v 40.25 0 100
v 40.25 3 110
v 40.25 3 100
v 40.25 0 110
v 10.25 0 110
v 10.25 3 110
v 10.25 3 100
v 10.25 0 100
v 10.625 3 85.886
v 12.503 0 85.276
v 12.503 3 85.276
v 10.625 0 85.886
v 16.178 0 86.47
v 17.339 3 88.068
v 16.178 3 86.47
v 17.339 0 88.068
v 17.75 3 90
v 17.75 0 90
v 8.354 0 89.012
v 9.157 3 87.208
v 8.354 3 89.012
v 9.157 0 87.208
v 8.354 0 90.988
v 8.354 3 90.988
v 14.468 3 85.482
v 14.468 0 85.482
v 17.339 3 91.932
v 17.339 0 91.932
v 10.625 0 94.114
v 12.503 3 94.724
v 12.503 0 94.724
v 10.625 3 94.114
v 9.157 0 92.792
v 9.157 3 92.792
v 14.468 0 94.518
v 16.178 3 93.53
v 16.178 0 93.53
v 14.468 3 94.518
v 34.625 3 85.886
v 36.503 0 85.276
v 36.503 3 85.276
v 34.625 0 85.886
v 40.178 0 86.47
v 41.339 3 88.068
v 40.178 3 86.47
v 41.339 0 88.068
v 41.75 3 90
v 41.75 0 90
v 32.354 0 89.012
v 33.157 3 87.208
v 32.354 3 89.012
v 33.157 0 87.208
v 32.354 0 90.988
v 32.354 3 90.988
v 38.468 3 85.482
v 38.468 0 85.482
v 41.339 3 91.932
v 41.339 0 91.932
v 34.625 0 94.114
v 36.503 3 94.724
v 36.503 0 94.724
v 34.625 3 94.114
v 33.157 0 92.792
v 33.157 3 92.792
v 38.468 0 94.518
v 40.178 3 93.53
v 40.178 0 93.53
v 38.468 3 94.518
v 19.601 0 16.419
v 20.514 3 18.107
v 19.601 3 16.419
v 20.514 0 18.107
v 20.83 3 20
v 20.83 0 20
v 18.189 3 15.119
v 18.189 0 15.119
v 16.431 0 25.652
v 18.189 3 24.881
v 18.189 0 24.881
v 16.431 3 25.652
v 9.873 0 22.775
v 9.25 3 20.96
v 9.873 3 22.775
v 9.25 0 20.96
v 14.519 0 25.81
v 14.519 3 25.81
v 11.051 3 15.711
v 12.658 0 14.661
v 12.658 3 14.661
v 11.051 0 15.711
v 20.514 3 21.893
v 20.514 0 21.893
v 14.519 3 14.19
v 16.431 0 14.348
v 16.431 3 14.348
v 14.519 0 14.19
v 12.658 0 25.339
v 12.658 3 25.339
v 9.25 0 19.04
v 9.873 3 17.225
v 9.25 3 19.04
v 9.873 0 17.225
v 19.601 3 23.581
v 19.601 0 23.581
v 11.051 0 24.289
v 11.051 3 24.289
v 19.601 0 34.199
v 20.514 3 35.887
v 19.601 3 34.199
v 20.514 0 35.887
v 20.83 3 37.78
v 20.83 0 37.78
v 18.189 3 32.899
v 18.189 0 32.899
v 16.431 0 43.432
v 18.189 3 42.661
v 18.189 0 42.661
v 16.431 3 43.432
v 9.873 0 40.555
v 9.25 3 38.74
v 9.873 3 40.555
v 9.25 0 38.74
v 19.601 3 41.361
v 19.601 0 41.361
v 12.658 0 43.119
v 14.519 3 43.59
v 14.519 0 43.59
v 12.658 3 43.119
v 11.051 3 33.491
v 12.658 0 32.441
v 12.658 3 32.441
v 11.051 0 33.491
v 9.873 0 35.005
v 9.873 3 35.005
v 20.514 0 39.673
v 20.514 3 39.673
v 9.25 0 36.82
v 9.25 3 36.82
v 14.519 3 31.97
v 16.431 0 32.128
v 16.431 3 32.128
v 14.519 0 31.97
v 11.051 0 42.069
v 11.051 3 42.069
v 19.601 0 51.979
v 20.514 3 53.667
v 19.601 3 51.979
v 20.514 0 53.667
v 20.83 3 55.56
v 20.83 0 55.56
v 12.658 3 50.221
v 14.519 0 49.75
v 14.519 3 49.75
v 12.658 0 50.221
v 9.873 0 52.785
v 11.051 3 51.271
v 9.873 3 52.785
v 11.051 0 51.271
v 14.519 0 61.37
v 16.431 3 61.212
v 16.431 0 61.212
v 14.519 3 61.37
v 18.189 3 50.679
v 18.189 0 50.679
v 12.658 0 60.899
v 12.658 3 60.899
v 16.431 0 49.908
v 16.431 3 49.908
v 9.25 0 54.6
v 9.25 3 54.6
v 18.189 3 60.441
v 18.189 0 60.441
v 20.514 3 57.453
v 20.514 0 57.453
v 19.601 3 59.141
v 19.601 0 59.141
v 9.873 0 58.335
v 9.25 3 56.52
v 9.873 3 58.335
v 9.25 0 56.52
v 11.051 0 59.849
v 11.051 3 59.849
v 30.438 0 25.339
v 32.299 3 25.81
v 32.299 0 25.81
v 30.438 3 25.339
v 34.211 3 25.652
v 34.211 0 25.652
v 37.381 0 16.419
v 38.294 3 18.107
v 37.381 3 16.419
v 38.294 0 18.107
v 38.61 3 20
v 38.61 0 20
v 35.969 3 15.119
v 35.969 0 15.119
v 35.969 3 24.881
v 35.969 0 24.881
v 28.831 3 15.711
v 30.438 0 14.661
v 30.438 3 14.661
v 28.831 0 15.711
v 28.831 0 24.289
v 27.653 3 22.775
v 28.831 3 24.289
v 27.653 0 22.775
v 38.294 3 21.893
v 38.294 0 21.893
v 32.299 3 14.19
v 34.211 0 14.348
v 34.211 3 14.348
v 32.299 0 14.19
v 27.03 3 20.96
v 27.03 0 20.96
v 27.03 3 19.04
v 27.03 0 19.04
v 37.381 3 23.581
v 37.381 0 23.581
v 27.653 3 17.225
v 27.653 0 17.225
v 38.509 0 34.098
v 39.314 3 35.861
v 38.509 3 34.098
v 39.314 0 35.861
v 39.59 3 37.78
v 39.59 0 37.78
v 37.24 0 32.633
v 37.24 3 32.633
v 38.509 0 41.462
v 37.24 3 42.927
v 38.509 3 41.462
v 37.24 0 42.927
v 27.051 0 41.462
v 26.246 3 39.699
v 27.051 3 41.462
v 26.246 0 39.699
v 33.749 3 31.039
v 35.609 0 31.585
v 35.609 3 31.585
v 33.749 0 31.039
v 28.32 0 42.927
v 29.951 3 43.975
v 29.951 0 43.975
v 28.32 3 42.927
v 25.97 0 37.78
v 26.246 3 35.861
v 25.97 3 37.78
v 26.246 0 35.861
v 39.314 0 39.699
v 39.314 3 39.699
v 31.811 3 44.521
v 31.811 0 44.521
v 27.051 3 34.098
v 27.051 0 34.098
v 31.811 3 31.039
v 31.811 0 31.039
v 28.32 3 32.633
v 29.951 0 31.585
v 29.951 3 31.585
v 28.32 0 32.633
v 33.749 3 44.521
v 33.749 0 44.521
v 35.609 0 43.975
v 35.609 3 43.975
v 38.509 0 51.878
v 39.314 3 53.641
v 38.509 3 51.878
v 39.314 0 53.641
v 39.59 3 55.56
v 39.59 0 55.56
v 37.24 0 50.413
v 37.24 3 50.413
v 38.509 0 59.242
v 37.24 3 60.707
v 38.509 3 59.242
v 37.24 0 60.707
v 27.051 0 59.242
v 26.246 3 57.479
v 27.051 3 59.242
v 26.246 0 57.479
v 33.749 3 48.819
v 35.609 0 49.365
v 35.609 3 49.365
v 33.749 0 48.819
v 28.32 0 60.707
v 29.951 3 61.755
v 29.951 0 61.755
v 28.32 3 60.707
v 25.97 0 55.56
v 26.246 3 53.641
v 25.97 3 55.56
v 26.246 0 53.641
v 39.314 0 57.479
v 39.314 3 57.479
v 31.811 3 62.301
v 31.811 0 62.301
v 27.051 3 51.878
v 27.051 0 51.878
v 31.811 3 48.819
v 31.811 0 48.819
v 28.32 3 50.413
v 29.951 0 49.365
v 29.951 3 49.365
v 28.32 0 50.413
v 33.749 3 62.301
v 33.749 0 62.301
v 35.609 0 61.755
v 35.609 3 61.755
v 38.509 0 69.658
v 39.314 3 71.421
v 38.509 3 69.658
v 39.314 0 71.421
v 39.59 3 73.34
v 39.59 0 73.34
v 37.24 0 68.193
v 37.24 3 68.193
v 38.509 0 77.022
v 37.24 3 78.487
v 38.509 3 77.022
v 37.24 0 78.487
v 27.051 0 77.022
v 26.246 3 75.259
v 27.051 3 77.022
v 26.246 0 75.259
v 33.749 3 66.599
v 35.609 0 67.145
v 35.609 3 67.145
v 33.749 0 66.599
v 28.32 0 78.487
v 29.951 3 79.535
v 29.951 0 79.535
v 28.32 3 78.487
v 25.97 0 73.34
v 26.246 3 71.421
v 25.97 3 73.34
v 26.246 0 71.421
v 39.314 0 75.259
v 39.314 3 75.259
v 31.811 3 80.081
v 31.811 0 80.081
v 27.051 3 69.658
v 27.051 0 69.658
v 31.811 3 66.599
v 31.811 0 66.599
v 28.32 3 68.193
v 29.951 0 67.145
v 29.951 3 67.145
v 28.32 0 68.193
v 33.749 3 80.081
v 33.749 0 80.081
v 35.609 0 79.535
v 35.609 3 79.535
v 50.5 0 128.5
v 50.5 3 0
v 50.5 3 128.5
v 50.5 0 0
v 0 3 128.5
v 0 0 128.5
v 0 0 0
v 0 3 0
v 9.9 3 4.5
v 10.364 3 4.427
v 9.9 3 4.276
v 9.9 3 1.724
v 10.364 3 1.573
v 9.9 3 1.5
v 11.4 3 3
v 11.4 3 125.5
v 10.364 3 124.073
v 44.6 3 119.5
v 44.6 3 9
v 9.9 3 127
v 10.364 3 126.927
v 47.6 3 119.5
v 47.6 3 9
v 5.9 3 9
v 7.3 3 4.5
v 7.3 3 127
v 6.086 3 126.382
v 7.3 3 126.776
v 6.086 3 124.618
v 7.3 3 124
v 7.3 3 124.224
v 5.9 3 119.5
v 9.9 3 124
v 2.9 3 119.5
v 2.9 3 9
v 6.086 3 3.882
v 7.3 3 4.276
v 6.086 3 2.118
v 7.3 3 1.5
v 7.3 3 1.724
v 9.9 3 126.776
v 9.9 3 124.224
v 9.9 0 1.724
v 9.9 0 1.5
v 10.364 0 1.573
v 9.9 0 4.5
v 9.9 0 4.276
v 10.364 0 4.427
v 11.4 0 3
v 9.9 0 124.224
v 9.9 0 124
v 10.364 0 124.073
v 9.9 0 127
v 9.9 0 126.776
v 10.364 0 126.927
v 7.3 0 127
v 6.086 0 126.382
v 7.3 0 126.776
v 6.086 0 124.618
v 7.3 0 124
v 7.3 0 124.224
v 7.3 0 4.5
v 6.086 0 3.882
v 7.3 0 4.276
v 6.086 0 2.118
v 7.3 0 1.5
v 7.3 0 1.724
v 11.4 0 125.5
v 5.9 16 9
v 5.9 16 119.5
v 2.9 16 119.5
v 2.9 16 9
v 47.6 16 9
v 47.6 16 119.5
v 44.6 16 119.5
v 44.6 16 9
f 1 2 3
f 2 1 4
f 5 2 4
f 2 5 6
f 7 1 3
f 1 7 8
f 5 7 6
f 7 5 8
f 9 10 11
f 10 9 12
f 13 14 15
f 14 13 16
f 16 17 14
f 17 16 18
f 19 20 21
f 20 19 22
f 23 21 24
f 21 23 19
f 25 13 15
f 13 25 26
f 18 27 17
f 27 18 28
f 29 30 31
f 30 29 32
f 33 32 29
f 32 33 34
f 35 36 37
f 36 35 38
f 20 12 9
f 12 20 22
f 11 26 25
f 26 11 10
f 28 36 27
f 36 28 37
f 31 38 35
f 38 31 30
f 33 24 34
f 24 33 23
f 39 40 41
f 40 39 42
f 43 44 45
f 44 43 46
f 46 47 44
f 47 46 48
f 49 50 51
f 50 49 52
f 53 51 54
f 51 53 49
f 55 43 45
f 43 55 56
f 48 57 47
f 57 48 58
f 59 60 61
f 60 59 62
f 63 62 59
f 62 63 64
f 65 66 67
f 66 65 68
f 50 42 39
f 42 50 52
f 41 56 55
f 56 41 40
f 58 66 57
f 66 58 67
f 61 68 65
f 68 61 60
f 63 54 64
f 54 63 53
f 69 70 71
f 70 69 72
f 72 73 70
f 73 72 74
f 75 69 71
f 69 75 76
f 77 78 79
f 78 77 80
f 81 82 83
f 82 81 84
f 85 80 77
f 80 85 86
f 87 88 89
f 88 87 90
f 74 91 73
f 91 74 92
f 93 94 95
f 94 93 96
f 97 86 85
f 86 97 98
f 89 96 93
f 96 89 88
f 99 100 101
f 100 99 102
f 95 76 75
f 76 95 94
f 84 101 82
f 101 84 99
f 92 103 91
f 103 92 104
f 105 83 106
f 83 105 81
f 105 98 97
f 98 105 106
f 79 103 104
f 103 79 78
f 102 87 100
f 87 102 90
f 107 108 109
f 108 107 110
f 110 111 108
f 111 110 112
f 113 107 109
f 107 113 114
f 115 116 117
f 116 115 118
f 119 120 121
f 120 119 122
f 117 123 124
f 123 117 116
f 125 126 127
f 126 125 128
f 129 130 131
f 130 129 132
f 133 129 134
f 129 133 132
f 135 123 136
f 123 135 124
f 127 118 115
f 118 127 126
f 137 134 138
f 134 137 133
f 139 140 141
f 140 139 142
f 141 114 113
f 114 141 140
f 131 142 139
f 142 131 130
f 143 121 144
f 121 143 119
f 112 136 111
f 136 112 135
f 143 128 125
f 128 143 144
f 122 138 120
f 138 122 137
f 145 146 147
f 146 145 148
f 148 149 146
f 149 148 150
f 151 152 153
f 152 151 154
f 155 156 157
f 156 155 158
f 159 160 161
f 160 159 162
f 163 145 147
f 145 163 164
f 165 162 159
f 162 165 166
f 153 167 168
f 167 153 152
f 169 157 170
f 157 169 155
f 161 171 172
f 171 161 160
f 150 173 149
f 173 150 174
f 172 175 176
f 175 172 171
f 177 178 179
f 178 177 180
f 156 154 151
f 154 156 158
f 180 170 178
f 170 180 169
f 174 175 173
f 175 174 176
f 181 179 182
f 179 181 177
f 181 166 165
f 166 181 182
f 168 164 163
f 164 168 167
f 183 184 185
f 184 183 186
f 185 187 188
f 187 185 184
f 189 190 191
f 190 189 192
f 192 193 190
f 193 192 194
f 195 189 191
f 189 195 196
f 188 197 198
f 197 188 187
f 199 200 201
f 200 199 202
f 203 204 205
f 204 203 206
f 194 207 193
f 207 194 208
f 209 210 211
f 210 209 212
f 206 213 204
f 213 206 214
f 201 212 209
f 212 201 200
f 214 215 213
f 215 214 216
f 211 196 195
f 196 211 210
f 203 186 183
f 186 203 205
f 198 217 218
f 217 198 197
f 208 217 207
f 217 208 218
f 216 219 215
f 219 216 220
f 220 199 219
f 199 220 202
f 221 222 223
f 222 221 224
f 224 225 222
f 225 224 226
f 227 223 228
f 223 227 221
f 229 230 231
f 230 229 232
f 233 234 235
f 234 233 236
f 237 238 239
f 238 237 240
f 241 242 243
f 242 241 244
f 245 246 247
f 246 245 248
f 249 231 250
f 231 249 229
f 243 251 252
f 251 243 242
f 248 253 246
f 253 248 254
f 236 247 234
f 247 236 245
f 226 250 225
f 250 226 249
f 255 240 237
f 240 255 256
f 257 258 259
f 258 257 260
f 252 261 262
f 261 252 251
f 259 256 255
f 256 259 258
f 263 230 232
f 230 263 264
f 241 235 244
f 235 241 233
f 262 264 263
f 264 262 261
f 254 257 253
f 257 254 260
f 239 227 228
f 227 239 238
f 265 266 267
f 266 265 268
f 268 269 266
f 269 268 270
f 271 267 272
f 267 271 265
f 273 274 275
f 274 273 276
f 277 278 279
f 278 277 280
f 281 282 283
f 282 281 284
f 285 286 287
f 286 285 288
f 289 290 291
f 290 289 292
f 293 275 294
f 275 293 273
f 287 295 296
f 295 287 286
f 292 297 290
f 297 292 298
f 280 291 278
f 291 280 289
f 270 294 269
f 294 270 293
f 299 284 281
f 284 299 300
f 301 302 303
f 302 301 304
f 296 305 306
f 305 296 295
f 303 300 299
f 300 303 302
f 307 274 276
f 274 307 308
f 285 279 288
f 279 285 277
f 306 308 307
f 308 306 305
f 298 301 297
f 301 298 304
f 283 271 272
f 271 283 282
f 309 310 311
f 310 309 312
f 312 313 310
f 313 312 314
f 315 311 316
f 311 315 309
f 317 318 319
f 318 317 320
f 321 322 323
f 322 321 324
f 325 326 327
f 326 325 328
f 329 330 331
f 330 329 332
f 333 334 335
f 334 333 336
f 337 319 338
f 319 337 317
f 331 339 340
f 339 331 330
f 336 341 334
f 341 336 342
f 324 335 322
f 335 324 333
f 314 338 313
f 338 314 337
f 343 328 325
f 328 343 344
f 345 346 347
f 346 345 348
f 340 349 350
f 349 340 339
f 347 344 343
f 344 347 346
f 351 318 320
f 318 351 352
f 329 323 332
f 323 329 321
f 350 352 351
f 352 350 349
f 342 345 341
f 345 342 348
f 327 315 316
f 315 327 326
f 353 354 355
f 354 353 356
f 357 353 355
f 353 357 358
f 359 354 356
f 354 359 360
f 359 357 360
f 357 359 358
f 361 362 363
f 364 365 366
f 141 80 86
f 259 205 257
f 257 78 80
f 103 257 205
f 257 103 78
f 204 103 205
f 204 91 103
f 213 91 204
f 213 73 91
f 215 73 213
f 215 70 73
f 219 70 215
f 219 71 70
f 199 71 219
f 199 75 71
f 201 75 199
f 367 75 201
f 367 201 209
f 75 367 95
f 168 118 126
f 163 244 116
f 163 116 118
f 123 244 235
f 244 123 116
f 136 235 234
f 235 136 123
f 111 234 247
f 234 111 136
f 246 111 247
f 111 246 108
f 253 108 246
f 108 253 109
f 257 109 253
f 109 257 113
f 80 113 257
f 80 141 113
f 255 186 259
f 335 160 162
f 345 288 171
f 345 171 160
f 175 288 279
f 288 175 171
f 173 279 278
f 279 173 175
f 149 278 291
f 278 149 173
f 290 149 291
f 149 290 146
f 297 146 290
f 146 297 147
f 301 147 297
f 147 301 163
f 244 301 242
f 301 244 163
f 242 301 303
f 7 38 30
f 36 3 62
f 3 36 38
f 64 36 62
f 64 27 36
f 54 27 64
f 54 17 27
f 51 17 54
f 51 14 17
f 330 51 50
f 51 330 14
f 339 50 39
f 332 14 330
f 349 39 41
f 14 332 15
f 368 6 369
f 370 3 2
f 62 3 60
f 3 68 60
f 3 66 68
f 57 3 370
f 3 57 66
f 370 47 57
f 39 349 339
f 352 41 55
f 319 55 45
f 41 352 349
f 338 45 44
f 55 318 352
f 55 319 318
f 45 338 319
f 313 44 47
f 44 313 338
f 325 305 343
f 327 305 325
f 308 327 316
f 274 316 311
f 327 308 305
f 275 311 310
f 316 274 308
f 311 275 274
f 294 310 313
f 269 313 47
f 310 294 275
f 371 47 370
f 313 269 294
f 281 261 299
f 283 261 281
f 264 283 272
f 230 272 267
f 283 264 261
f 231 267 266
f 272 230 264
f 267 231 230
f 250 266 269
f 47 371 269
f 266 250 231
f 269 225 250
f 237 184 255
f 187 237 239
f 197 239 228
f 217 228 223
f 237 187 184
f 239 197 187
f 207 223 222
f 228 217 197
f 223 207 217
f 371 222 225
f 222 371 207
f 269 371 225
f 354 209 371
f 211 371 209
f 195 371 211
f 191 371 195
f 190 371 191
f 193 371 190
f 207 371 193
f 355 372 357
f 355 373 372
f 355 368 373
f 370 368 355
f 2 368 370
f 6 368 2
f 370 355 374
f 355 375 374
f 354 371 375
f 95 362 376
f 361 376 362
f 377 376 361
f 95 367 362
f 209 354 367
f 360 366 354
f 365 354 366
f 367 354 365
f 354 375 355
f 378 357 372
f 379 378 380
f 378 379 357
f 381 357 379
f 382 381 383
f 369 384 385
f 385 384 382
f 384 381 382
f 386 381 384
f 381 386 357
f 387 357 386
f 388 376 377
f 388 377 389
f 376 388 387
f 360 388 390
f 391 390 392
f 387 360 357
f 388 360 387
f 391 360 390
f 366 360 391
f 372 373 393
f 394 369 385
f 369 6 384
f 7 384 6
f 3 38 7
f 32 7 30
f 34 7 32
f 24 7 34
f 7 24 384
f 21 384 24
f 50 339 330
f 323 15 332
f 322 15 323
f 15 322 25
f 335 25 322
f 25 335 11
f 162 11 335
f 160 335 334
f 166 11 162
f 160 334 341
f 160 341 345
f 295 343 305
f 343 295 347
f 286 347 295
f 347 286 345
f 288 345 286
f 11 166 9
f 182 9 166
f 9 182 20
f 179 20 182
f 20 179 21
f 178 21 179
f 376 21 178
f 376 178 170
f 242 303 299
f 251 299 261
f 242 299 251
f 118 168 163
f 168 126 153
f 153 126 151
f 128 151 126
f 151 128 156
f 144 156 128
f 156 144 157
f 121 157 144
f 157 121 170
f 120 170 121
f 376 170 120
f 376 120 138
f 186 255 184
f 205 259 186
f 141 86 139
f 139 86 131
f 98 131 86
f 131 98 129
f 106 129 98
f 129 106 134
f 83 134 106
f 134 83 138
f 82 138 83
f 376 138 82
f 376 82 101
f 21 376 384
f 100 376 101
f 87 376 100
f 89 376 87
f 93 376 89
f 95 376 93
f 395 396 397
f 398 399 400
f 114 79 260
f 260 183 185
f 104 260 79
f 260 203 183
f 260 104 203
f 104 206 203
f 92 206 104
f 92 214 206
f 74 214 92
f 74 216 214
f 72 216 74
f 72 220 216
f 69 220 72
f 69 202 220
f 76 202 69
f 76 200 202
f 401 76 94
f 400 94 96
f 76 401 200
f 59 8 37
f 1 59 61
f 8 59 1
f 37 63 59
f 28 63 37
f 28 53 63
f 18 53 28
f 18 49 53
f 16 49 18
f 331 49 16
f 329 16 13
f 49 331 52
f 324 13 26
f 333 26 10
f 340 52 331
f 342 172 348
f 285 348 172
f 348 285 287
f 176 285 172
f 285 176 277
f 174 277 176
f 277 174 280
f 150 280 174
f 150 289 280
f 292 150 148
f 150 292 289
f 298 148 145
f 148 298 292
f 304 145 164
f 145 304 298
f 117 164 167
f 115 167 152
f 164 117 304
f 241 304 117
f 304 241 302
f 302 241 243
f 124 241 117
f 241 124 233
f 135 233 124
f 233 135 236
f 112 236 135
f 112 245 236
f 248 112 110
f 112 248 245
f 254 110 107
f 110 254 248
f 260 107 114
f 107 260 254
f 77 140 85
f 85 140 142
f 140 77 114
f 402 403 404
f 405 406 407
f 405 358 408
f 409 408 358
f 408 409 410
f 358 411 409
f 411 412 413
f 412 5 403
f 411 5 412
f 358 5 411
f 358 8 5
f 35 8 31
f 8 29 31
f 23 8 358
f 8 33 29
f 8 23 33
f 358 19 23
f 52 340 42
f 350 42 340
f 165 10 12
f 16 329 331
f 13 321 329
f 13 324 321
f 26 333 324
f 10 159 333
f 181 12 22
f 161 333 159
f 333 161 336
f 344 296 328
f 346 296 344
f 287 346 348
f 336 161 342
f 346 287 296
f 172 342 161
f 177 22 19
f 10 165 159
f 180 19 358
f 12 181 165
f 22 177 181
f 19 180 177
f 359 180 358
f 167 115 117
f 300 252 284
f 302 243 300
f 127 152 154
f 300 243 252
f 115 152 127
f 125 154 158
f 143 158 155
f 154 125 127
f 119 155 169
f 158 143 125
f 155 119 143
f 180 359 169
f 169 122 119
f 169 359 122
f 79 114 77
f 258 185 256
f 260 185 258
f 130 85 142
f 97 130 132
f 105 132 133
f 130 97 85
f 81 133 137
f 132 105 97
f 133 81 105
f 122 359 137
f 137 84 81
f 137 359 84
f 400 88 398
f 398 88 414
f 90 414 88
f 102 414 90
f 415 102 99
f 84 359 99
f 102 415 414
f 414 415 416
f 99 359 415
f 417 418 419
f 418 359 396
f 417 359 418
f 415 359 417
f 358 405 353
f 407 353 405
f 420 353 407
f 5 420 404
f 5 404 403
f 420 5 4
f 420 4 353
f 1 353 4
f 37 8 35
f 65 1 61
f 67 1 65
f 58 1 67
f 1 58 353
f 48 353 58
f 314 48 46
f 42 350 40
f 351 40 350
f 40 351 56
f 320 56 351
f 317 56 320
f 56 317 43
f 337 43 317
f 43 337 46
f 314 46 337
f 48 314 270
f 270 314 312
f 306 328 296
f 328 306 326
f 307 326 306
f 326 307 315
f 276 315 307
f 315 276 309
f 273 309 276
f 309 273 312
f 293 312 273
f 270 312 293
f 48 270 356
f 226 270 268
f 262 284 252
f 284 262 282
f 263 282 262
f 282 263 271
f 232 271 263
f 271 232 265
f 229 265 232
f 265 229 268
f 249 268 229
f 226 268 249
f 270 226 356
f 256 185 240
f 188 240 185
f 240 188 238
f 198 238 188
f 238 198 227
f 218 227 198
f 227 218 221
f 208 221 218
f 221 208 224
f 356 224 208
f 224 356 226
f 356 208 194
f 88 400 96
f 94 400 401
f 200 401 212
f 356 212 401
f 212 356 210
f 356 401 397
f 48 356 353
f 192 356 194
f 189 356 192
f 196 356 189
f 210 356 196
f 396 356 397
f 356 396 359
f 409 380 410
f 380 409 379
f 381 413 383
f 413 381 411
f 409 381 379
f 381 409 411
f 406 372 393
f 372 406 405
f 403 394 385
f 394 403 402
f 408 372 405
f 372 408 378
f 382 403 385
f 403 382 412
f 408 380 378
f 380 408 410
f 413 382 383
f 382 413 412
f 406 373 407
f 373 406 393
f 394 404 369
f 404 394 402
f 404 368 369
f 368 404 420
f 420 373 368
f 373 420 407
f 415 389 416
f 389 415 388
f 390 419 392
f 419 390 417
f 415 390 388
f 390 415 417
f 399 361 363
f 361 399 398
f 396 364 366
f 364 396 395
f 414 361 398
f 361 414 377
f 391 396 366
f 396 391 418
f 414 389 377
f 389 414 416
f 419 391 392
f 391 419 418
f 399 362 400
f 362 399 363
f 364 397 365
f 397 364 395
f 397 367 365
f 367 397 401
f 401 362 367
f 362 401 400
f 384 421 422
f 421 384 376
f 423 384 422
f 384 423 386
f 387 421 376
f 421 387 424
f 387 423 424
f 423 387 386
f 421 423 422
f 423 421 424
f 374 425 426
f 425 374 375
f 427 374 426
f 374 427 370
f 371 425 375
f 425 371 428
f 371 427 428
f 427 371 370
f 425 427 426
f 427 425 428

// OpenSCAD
//!OpenSCAD

// from https://www.blockscad3d.com/community/projects/718412

module hole_for_switch() {
  translate([0,-y2/2,0])
  rotate([270, 0, 0]){
      cylinder(r1=switch_dia, r2=switch_dia, h=y2*2, center=false);
  }
}

module hole_for_potentiometer() {
  translate([0,-y2/2,0])
  rotate([270, 0, 0]){
    cylinder(r1=pot_dia, r2=pot_dia, h=y2*2, center=false);
  }
}

module make_face_plate() {
  difference() {
    cube([x1, y2, z1], center=false);

    union(){
      translate([15, 0, (20 + 0 * 17.78)]){
        hole_for_jack();
      }
      translate([15, 0, (20 + 1 * 17.78)]){
        hole_for_jack();
      }
      translate([15, 0, (20 + 2 * 17.78)]){
        hole_for_jack();
      }
      translate([(15 + 17.78), 0, (20 + 0 * 17.78)]){
        hole_for_jack();
      }
      translate([(15 + 17.78), 0, (20 + 1 * 17.78)]){
        hole_for_potentiometer();
      }
      translate([(15 + 17.78), 0, (20 + 2 * 17.78)]){
        hole_for_potentiometer();
      }
      translate([(15 + 17.78), 0, (20 + 3 * 17.78)]){
        hole_for_potentiometer();
      }
      display_and_buttons();
    }
  }
}

module hole_for_jack() {
  translate([0,-y2/2,0])
  rotate([270, 0, 0]){
    cylinder(r1=jack_dia, r2=jack_dia, h=y2*2, center=false);
  }
}

module make_slot_pair() {
  union(){
    translate([0, 0, (z1 - z4)]){
      make_slot();
    }
    translate([0, 0, z4]){
      make_slot();
    }
  }
}

module make_right_slot_pair() {
  translate([(x4 + 5.08 * (Width_HP - 4)), 0, 0]){
    union(){
      translate([0, 0, (z1 - z4)]){
        make_slot();
      }
      translate([0, 0, z4]){
        make_slot();
      }
    }
  }
}

module display_and_buttons() {
  union(){
    translate([(x1 / 2), 0, 105]){
      cube([30, 10, 10], center=true);
    }
    translate([(5 + 8), 0, 90]){
      hole_for_switch();
    }
    translate([(5 + 32), 0, 90]){
      hole_for_switch();
    }
  }
}

module make_slot() {
  translate([0,-y2/2,0])
  union(){
    translate([x5, 0, 0]){
      rotate([270, 0, 0]){
        cylinder(r1=(z3 / 2), r2=(z3 / 2), h=y2*2, center=false);
      }
    }
    translate([x4, 0, 0]){
      rotate([270, 0, 0]){
        cylinder(r1=(z3 / 2), r2=(z3 / 2), h=y2*2, center=false);
      }
      translate([0, 0, ((z3 / 2) * -1)]){
        cube([(x5 - x4), y2*2, z3], center=false);
      }
    }
  }
}

module left_stiffening_rib() {
  translate([x2, 0, ((z1 - z2) / 2)]){
    cube([x3, y1, z2], center=false);
  }
}

module right_stiffening_rib() {
  translate([((x1 - x3) - x2), 0, ((z1 - z2) / 2)]){
    cube([x3, y1, z2], center=false);
  }
}

Width_HP = 10;
jack_dia = 5.83;
pot_dia = 6.81;
switch_dia = 4.75;

// panel dimensions
// these will likely stay the same one dialed in
x1 = Width_HP * 5.08 - 0.3; // width of the front plate
x2 = 2.9; // inset of the stiffening ribs behind the front plate from the edges
x3 = 3;   // width of the stiffening ribs
x4 = 7.3; // distance to center of left-hand radius of mounting slot
x5 = 9.9; // distance to center of right-hand radius of mounting slot
y1 = 16;  // height of stiffening ribs (distance they extend back into the rack)
y2 = 3;   // thickness of front plate
z1 = 128.5; // height of the plate
z2 = 110.5; // length of the stiffening ribs (vertical distance)
z3 = 3;   // radius of mounting slots
z4 = 3;   // distance to center of radius/slot from lower edge of front plate
union(){
  left_stiffening_rib();
  right_stiffening_rib();
  
  difference() {
    make_face_plate();

    // add a second set of mounting slots if larger than 10hp
    if (Width_HP <= 10) {
      make_slot_pair();
    } else {
      union(){
        make_right_slot_pair();
        make_slot_pair();
      }
    }
    echo("Final panel width: ", x1);
  }
}
